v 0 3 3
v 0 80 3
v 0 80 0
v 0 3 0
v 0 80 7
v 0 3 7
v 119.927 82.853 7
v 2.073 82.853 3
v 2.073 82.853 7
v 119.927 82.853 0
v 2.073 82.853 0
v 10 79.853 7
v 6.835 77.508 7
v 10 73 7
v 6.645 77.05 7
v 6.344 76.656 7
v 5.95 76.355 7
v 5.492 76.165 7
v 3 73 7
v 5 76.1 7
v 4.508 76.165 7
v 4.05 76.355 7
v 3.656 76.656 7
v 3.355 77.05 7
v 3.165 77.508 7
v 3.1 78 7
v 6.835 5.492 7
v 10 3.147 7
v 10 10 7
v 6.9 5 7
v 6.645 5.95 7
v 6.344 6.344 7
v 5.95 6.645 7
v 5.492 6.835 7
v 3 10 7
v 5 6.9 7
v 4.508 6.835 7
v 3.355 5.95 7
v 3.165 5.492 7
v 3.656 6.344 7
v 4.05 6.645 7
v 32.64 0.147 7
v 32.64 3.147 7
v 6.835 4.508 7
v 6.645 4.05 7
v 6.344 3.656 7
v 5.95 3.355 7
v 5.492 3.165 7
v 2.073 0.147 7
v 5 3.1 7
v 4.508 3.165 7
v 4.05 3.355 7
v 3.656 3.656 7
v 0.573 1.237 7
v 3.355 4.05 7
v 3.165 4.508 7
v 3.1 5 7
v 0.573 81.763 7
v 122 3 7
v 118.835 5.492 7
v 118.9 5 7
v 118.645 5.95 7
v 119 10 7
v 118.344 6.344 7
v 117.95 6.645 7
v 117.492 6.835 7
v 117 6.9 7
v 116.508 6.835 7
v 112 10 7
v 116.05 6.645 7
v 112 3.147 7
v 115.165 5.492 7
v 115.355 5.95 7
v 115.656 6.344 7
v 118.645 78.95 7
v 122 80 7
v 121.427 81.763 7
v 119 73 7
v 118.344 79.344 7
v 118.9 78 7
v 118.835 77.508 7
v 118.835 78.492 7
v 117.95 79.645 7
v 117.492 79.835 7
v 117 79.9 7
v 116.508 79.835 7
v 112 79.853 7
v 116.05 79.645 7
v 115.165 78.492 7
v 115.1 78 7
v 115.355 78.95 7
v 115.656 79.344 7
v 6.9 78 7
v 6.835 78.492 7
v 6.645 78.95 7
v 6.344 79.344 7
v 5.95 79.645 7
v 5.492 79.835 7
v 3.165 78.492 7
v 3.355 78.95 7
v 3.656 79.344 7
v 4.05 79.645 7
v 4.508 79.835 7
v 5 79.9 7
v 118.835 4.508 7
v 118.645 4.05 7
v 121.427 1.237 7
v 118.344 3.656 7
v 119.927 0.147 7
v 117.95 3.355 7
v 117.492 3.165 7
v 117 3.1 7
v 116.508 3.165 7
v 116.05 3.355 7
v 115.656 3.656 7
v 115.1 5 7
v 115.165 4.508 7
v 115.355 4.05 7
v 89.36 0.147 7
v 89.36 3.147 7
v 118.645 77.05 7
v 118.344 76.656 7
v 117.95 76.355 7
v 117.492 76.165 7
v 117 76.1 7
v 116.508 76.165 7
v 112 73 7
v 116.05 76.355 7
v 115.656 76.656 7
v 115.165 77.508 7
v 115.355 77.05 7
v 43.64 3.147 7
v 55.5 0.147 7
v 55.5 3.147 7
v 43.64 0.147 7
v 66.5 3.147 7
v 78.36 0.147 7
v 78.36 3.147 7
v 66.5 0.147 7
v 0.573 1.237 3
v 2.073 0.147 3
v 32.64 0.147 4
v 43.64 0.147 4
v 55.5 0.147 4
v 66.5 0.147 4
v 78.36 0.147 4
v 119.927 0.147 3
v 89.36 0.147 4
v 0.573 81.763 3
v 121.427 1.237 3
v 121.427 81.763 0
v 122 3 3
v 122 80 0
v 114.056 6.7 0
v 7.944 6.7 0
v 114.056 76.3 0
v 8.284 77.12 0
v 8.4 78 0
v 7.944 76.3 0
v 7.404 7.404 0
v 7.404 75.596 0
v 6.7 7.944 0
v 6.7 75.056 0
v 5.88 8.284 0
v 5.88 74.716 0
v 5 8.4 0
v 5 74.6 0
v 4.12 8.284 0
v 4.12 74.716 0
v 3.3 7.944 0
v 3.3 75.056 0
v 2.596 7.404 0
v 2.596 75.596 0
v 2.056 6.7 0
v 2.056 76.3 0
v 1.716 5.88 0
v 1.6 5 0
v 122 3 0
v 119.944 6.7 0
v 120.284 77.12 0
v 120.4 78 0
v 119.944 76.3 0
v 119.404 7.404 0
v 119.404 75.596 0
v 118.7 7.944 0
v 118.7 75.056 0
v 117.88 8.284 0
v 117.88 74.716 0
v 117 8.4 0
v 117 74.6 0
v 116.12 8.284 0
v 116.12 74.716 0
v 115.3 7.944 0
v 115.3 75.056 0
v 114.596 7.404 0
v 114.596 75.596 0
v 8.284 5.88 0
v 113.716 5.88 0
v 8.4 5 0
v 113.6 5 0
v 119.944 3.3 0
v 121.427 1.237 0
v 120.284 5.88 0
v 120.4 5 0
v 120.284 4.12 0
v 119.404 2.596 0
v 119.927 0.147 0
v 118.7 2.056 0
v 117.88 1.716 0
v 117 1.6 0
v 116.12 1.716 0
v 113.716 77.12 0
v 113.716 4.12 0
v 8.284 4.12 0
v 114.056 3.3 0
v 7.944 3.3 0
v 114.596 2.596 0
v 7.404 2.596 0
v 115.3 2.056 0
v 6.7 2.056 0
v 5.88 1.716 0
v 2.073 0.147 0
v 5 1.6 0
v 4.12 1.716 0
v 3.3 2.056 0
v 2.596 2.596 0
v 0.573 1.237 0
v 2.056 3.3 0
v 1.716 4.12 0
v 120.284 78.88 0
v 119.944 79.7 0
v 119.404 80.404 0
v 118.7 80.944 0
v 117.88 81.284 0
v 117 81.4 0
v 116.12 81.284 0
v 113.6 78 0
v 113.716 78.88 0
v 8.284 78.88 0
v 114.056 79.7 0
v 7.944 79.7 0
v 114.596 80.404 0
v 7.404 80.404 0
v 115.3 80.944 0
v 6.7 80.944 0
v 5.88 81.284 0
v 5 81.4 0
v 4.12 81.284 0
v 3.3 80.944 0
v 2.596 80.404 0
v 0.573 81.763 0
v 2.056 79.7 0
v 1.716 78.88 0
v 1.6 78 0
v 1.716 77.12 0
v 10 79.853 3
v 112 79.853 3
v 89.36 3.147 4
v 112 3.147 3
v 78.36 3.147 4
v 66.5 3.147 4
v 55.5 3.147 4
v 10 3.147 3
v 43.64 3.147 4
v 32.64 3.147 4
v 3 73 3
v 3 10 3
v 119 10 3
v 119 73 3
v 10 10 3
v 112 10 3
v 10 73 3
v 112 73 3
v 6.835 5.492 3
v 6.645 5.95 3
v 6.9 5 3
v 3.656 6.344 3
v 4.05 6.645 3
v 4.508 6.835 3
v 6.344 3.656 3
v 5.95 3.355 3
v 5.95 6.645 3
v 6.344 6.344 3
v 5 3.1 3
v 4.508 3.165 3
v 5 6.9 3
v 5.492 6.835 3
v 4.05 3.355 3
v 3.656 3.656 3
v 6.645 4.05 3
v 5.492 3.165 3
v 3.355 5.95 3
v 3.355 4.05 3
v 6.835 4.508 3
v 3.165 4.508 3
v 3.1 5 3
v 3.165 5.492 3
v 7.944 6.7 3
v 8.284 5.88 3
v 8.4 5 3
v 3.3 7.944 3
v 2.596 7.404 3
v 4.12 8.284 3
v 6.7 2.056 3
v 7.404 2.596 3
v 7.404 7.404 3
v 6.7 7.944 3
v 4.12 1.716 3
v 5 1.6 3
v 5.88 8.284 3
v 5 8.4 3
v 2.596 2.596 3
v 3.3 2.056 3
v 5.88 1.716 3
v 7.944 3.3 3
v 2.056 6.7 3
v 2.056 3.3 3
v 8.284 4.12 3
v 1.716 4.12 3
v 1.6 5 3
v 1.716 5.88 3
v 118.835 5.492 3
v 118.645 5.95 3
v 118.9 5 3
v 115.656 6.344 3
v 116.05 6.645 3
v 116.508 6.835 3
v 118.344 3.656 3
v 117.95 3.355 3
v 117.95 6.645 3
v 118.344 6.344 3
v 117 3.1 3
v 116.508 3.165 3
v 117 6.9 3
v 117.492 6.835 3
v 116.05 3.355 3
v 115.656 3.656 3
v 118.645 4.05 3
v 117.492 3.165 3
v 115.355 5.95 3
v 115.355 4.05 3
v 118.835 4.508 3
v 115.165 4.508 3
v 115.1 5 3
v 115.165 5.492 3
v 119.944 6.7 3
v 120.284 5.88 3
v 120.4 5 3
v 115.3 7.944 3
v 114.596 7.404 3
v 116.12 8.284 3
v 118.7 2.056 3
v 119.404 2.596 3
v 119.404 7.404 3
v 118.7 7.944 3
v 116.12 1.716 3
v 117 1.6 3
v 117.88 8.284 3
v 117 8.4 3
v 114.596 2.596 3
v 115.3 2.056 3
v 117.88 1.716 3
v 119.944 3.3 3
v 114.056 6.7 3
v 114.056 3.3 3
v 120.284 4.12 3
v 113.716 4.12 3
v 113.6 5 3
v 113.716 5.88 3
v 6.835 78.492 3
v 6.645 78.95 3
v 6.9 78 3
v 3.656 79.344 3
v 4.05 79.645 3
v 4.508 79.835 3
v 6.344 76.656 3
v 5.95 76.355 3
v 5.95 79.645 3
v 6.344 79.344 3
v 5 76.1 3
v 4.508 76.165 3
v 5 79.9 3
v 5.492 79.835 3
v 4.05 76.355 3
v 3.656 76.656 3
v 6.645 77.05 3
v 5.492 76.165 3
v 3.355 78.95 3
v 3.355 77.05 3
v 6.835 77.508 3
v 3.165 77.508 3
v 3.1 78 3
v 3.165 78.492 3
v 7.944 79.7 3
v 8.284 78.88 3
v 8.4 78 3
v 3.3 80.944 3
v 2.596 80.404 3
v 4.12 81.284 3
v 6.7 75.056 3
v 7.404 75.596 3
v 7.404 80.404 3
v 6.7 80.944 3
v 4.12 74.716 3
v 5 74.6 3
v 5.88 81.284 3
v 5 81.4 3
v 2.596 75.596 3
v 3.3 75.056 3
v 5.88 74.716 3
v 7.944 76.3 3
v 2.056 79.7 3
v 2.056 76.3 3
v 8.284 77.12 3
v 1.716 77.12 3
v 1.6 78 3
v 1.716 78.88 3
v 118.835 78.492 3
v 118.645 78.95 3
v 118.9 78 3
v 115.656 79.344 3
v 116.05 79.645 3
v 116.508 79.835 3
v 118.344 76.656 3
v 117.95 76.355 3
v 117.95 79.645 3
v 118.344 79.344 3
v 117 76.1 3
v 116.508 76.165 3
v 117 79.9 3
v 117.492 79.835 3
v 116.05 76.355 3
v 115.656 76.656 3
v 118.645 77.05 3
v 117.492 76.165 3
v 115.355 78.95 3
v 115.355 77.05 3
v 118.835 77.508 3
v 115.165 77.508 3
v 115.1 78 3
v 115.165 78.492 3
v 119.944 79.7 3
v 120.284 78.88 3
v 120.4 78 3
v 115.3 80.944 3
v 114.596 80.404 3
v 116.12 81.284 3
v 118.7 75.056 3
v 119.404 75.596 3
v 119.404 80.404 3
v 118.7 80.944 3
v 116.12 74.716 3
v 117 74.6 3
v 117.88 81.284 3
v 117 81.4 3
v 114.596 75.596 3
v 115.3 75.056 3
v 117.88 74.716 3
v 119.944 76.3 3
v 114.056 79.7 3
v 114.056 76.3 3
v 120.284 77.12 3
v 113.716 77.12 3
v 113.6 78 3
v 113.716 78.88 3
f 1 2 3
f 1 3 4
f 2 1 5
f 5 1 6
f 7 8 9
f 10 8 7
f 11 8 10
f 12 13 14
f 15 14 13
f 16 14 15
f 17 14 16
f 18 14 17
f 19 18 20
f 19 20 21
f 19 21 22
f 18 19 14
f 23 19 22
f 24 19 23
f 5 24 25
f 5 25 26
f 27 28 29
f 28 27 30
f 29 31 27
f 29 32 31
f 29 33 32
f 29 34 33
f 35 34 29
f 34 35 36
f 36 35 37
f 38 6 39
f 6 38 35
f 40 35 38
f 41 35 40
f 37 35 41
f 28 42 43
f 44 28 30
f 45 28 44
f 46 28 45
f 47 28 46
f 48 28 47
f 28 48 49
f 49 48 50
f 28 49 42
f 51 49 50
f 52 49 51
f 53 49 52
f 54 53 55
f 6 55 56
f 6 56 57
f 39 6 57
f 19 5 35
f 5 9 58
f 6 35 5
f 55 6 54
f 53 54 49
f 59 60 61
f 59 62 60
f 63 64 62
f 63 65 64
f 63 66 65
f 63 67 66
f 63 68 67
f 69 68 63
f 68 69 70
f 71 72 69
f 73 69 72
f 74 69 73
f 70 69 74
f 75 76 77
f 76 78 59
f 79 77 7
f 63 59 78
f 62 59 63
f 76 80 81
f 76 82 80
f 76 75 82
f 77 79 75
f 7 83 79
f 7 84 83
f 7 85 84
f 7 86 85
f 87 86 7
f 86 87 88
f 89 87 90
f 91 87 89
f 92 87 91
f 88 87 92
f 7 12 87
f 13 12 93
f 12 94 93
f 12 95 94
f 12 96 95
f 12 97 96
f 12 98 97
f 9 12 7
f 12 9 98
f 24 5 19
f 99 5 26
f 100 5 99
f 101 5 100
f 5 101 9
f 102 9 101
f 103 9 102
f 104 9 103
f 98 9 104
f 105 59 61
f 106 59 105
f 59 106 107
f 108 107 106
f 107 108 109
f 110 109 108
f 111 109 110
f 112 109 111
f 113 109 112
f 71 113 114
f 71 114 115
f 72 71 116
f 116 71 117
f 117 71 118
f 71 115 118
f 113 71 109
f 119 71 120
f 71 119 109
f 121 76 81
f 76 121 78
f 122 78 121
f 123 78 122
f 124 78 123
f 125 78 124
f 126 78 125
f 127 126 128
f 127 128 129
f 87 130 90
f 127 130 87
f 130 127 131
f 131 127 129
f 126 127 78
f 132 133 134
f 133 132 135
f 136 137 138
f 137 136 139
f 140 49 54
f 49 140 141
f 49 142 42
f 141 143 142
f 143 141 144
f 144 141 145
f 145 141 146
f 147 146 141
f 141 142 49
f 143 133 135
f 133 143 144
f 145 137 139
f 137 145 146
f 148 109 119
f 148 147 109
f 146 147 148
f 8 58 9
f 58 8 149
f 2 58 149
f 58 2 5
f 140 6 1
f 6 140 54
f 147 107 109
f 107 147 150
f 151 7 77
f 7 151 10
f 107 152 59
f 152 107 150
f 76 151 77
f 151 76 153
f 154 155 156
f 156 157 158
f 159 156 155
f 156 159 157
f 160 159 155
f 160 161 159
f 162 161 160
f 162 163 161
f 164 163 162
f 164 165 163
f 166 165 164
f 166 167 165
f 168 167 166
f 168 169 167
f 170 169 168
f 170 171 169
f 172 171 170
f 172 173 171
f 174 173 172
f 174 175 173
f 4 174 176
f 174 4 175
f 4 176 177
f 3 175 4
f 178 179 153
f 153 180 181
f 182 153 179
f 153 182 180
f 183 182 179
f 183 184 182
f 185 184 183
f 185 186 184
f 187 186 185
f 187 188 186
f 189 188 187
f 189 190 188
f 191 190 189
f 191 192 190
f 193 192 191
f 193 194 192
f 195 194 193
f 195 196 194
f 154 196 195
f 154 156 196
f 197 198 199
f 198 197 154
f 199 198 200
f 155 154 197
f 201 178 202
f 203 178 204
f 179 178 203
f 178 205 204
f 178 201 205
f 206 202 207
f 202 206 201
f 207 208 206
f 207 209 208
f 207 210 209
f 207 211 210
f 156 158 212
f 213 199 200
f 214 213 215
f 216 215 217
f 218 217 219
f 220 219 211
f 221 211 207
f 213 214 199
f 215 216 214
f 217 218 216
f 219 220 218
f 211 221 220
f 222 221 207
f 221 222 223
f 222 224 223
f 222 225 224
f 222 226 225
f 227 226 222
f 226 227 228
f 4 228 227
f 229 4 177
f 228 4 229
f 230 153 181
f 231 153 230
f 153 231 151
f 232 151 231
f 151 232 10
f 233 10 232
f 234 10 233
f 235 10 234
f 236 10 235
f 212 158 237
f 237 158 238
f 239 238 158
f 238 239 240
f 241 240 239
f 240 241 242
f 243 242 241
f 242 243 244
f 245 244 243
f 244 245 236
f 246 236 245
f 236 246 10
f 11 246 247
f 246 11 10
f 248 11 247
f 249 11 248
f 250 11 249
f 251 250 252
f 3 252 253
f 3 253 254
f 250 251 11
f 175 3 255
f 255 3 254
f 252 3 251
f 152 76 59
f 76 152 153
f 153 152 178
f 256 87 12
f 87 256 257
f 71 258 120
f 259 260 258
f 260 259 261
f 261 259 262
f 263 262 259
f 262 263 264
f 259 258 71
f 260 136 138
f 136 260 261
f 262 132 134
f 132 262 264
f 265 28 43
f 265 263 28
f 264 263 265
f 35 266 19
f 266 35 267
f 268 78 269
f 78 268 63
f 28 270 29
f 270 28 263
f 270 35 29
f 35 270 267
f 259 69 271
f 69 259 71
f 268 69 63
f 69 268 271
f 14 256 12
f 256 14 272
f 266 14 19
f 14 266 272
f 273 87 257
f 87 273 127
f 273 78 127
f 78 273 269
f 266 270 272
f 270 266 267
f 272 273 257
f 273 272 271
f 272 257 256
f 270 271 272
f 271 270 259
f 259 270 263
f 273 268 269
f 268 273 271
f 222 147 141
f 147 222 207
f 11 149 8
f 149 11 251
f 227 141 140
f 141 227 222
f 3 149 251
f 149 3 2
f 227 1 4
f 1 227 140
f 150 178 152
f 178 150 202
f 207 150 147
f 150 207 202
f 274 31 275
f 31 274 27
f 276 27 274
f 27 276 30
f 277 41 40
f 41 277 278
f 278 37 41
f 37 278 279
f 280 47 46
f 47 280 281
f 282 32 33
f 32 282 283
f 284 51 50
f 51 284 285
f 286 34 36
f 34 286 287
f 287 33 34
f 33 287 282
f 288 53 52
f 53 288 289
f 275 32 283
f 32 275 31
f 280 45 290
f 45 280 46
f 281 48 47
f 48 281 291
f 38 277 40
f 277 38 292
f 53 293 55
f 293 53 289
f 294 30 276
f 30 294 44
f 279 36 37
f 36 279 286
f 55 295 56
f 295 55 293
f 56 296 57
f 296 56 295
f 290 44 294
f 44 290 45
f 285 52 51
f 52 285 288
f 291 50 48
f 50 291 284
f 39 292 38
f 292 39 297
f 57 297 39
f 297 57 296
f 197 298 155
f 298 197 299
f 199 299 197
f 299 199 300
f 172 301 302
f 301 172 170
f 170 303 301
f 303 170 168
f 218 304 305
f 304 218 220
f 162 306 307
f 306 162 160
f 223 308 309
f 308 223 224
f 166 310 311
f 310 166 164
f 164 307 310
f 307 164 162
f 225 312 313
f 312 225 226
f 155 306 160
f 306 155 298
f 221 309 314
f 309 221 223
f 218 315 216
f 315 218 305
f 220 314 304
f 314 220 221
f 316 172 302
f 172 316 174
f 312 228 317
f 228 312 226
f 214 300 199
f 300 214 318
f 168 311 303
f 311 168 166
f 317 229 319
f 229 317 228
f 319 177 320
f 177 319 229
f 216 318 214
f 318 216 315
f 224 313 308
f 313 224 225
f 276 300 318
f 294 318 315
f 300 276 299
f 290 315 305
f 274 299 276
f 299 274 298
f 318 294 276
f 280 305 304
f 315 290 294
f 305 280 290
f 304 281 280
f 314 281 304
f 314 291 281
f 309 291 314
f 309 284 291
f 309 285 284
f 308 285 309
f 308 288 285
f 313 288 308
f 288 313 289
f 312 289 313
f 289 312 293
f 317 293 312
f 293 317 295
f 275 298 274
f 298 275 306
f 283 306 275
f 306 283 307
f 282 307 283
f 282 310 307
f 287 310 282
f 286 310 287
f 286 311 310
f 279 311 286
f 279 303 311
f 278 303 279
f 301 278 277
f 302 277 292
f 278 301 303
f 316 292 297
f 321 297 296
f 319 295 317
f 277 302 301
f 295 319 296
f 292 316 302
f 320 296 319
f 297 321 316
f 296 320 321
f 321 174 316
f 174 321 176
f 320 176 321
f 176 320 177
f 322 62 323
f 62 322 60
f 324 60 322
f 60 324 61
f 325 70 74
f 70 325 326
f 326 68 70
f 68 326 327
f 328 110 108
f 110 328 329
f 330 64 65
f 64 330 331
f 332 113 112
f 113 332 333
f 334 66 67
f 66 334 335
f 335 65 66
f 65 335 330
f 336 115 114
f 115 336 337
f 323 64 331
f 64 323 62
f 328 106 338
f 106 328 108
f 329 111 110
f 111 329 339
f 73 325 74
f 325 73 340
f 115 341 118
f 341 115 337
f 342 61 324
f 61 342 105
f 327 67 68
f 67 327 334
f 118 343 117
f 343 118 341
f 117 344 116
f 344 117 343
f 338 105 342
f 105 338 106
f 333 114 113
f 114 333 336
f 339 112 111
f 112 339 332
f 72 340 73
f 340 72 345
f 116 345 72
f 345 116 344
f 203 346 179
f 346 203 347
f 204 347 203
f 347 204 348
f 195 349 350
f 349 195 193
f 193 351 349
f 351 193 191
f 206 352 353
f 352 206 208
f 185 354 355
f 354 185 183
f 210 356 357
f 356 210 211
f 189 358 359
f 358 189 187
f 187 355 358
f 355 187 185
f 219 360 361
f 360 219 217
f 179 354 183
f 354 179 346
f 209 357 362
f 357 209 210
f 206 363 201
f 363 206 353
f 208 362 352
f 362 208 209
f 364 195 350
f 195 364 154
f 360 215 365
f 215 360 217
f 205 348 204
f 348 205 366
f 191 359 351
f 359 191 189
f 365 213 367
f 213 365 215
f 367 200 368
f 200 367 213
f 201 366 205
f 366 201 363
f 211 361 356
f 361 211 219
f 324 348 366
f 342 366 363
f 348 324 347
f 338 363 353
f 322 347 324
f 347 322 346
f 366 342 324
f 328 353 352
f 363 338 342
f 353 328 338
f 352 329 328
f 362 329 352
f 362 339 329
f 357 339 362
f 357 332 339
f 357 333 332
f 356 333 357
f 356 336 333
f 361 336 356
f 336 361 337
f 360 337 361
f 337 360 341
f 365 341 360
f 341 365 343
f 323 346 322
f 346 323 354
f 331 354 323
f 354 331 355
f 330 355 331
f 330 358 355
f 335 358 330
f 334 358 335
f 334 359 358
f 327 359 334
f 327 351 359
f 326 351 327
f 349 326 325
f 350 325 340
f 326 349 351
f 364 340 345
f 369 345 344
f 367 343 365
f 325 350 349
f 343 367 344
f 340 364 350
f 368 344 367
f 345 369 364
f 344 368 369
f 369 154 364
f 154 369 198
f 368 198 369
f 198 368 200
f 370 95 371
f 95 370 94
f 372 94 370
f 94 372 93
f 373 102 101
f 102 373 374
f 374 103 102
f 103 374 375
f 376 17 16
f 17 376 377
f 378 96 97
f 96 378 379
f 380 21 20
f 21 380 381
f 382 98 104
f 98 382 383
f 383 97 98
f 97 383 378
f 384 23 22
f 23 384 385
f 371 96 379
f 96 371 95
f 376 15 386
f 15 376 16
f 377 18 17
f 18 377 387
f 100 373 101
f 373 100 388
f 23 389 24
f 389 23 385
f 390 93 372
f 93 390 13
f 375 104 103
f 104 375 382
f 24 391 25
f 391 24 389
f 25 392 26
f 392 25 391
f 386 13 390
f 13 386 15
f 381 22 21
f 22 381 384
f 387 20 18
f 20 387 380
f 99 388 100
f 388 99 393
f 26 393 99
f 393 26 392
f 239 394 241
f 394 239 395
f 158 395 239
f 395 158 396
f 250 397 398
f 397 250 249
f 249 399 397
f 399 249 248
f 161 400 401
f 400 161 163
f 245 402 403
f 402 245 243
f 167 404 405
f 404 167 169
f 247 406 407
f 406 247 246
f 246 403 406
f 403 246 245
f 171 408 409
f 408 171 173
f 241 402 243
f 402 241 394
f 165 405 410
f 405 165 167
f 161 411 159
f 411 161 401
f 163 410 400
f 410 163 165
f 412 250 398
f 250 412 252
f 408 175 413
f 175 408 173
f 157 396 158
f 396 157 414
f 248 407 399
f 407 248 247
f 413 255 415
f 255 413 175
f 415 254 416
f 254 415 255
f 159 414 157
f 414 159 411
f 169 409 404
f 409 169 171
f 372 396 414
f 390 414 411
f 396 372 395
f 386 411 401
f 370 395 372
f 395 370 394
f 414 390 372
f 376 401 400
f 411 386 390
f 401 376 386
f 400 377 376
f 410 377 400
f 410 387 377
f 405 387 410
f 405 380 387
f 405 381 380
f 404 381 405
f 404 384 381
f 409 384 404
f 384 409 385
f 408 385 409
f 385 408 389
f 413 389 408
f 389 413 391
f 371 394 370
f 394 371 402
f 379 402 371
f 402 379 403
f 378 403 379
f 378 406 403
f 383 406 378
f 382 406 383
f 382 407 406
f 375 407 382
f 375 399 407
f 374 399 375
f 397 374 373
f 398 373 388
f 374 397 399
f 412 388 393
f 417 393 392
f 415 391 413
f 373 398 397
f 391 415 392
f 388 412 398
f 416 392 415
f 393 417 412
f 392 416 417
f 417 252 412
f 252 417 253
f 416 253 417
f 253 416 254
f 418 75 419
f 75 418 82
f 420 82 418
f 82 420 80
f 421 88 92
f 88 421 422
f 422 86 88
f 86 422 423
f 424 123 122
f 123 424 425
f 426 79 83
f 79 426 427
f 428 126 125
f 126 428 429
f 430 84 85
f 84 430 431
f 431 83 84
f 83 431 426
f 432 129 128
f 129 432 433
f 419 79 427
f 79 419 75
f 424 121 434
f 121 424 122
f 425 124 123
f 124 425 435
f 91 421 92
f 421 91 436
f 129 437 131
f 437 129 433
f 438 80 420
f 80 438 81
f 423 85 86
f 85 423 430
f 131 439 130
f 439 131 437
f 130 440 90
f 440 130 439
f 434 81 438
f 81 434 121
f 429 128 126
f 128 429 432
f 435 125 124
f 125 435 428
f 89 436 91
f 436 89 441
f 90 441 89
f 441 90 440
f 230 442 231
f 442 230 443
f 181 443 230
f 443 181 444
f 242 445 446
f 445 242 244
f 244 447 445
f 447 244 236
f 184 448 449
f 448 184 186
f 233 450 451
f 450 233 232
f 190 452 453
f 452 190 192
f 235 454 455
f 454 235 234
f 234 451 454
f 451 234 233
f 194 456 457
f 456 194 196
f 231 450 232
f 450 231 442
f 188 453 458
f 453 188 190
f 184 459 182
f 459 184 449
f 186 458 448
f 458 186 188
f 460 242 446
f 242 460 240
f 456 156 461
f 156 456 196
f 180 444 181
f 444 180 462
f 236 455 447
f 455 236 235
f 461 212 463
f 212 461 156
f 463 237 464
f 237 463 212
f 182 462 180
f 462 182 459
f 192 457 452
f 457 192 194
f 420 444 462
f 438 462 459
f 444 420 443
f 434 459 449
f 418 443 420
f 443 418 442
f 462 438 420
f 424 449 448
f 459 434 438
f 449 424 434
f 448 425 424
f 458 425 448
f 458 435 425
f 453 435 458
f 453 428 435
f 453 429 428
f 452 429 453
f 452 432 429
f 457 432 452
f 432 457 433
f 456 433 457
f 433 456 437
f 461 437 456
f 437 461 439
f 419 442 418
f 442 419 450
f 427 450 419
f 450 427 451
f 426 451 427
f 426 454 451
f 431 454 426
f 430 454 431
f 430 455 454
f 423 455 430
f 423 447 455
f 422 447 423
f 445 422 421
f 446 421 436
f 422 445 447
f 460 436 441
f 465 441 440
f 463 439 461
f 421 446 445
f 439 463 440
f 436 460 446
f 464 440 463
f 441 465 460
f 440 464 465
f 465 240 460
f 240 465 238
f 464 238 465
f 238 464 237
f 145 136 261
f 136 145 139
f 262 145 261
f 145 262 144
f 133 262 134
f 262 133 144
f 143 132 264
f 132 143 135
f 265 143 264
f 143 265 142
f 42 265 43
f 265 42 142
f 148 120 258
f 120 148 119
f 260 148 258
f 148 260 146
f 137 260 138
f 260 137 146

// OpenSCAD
// file: pillar-all1.scad
// Box for microusb power breakout.

// Copyright (C) 2016 Embecosm Limited (www.embecosm.com)

// Contributor: Jeremy Bennett <jeremy.bennett@embecosm.com>

// This file is licensed under the Creative Commons Attribution-ShareAlike 3.0
// Unported License. To view a copy of this license, visit
// http://creativecommons.org/licenses/by-sa/3.0/ or send a letter to Creative
// Commons, PO Box 1866, Mountain View, CA 94042, USA.


// A container for a circuit board containing microusb power breakout. This is
// commond code and definitions.

DELTA = 0.01;
PILLAR = 10;
WALL = 3;
PCB_X = 102 + (PILLAR - WALL) * 2;
PCB_Y = 77;
H = 20;      // overall box height
BASE_H = 10; // base height
TOP_H = H - BASE_H - WALL * 2;
USB_W = 11;  // usb power width
USB_H = 3;   // usb power height
WIRE_W = 40; // wire hole length
WIRE_H = 6;  // wire hole height
M3_R = 1.9;
M3_HEAD_R = 3.4;
M3_HEAD_H = 3;
M3_NUT_H = 2.5;

module round_cube (x, y, z) {
    hull () {
        translate (v = [-x/2 + 3, -y/2 + 3, 0])
            cylinder (r = 3, h = z, center = true);
        translate (v = [ x/2 - 3, -y/2 + 3, 0])
            cylinder (r = 3, h = z, center = true);
        translate (v = [-x/2 + 3,  y/2 - 3, 0])
            cylinder (r = 3, h = z, center = true);
        translate (v = [ x/2 - 3,  y/2 - 3, 0])
            cylinder (r = 3, h = z, center = true);
        }
}
// main file
// Box for microusb power breakout.

// Copyright (C) 2016 Embecosm Limited (www.embecosm.com)

// Contributor: Jeremy Bennett <jeremy.bennett@embecosm.com>

// This file is licensed under the Creative Commons Attribution-ShareAlike 3.0
// Unported License. To view a copy of this license, visit
// http://creativecommons.org/licenses/by-sa/3.0/ or send a letter to Creative
// Commons, PO Box 1866, Mountain View, CA 94042, USA.


// A container for a circuit board containing microusb power breakout. This is
// the lid.

include <pillar-all1.scad>

module sides () {
    translate (v = [PCB_X / 2 + WALL, PCB_Y / 2 + WALL, (TOP_H + WALL) / 2])
        difference () {
            round_cube (PCB_X + WALL * 2, PCB_Y + WALL * 2, TOP_H + WALL);
            round_cube (PCB_X, PCB_Y, TOP_H + WALL + DELTA);
        }
}

module base () {
    translate (v = [PCB_X / 2 + WALL, PCB_Y / 2 + WALL, WALL / 2])
        round_cube (PCB_X + WALL * 2, PCB_Y + WALL * 2, WALL);
}

module pillars () {
    translate (v = [WALL, WALL, WALL - DELTA])
        cube (size = [PILLAR - WALL, PILLAR - WALL, TOP_H + DELTA],
              center = false);
    translate (v = [WALL * 2 + PCB_X - PILLAR, WALL, WALL - DELTA])
        cube (size = [PILLAR - WALL, PILLAR - WALL, TOP_H + DELTA],
              center = false);
    translate (v = [WALL, WALL * 2 + PCB_Y - PILLAR, WALL - DELTA])
        cube (size = [PILLAR - WALL, PILLAR - WALL, TOP_H + DELTA],
              center = false);
    translate (v = [WALL * 2 + PCB_X - PILLAR,
                    WALL * 2 + PCB_Y - PILLAR, WALL - DELTA])
        cube (size = [PILLAR - WALL, PILLAR - WALL, TOP_H + DELTA],
              center = false);
}

module hole () {
    union () {
        cylinder (h = WALL + BASE_H + DELTA * 2, r = M3_R, $fn = 24,
                  center = false);
        cylinder (h = M3_HEAD_H + DELTA, r = M3_HEAD_R, $fn = 24,
                  center = false);
    }
}

module holes () {
    union () {
        translate (v = [PILLAR / 2, PILLAR / 2, -DELTA])
            hole ();
        translate (v = [WALL * 2 + PCB_X - PILLAR / 2, PILLAR / 2, -DELTA])
            hole ();
        translate (v = [PILLAR / 2, WALL * 2 + PCB_Y - PILLAR / 2, -DELTA])
            hole ();
        translate (v = [WALL * 2 + PCB_X - PILLAR / 2,
                        WALL * 2+ PCB_Y - PILLAR / 2, -DELTA])
            hole ();
    }
}

module usb_hole () {
    cube (size = [USB_W, WALL * 2, USB_H + DELTA], center = false);
}

module usb_holes () {
    translate (v = [PCB_X / 2 + WALL - USB_W / 2,
                    -WALL/2, WALL + TOP_H - USB_H])
        usb_hole ();
    // others are 9 .1" holes to the left and the right
    translate (v = [PCB_X / 2 + WALL - USB_W / 2 - 9 * 2.54,
                    -WALL/2, WALL + TOP_H - USB_H])
        usb_hole ();
    translate (v = [PCB_X / 2 + WALL - USB_W / 2 + 9 * 2.54,
                    -WALL/2, WALL + TOP_H - USB_H])
        usb_hole ();
}

module power_lid_base () {
    union () {
        sides ();
        base ();
        pillars ();
    }
}

module power_lid () {
    difference () {
        power_lid_base ();
        holes ();
        usb_holes ();
    }
}

power_lid ();
